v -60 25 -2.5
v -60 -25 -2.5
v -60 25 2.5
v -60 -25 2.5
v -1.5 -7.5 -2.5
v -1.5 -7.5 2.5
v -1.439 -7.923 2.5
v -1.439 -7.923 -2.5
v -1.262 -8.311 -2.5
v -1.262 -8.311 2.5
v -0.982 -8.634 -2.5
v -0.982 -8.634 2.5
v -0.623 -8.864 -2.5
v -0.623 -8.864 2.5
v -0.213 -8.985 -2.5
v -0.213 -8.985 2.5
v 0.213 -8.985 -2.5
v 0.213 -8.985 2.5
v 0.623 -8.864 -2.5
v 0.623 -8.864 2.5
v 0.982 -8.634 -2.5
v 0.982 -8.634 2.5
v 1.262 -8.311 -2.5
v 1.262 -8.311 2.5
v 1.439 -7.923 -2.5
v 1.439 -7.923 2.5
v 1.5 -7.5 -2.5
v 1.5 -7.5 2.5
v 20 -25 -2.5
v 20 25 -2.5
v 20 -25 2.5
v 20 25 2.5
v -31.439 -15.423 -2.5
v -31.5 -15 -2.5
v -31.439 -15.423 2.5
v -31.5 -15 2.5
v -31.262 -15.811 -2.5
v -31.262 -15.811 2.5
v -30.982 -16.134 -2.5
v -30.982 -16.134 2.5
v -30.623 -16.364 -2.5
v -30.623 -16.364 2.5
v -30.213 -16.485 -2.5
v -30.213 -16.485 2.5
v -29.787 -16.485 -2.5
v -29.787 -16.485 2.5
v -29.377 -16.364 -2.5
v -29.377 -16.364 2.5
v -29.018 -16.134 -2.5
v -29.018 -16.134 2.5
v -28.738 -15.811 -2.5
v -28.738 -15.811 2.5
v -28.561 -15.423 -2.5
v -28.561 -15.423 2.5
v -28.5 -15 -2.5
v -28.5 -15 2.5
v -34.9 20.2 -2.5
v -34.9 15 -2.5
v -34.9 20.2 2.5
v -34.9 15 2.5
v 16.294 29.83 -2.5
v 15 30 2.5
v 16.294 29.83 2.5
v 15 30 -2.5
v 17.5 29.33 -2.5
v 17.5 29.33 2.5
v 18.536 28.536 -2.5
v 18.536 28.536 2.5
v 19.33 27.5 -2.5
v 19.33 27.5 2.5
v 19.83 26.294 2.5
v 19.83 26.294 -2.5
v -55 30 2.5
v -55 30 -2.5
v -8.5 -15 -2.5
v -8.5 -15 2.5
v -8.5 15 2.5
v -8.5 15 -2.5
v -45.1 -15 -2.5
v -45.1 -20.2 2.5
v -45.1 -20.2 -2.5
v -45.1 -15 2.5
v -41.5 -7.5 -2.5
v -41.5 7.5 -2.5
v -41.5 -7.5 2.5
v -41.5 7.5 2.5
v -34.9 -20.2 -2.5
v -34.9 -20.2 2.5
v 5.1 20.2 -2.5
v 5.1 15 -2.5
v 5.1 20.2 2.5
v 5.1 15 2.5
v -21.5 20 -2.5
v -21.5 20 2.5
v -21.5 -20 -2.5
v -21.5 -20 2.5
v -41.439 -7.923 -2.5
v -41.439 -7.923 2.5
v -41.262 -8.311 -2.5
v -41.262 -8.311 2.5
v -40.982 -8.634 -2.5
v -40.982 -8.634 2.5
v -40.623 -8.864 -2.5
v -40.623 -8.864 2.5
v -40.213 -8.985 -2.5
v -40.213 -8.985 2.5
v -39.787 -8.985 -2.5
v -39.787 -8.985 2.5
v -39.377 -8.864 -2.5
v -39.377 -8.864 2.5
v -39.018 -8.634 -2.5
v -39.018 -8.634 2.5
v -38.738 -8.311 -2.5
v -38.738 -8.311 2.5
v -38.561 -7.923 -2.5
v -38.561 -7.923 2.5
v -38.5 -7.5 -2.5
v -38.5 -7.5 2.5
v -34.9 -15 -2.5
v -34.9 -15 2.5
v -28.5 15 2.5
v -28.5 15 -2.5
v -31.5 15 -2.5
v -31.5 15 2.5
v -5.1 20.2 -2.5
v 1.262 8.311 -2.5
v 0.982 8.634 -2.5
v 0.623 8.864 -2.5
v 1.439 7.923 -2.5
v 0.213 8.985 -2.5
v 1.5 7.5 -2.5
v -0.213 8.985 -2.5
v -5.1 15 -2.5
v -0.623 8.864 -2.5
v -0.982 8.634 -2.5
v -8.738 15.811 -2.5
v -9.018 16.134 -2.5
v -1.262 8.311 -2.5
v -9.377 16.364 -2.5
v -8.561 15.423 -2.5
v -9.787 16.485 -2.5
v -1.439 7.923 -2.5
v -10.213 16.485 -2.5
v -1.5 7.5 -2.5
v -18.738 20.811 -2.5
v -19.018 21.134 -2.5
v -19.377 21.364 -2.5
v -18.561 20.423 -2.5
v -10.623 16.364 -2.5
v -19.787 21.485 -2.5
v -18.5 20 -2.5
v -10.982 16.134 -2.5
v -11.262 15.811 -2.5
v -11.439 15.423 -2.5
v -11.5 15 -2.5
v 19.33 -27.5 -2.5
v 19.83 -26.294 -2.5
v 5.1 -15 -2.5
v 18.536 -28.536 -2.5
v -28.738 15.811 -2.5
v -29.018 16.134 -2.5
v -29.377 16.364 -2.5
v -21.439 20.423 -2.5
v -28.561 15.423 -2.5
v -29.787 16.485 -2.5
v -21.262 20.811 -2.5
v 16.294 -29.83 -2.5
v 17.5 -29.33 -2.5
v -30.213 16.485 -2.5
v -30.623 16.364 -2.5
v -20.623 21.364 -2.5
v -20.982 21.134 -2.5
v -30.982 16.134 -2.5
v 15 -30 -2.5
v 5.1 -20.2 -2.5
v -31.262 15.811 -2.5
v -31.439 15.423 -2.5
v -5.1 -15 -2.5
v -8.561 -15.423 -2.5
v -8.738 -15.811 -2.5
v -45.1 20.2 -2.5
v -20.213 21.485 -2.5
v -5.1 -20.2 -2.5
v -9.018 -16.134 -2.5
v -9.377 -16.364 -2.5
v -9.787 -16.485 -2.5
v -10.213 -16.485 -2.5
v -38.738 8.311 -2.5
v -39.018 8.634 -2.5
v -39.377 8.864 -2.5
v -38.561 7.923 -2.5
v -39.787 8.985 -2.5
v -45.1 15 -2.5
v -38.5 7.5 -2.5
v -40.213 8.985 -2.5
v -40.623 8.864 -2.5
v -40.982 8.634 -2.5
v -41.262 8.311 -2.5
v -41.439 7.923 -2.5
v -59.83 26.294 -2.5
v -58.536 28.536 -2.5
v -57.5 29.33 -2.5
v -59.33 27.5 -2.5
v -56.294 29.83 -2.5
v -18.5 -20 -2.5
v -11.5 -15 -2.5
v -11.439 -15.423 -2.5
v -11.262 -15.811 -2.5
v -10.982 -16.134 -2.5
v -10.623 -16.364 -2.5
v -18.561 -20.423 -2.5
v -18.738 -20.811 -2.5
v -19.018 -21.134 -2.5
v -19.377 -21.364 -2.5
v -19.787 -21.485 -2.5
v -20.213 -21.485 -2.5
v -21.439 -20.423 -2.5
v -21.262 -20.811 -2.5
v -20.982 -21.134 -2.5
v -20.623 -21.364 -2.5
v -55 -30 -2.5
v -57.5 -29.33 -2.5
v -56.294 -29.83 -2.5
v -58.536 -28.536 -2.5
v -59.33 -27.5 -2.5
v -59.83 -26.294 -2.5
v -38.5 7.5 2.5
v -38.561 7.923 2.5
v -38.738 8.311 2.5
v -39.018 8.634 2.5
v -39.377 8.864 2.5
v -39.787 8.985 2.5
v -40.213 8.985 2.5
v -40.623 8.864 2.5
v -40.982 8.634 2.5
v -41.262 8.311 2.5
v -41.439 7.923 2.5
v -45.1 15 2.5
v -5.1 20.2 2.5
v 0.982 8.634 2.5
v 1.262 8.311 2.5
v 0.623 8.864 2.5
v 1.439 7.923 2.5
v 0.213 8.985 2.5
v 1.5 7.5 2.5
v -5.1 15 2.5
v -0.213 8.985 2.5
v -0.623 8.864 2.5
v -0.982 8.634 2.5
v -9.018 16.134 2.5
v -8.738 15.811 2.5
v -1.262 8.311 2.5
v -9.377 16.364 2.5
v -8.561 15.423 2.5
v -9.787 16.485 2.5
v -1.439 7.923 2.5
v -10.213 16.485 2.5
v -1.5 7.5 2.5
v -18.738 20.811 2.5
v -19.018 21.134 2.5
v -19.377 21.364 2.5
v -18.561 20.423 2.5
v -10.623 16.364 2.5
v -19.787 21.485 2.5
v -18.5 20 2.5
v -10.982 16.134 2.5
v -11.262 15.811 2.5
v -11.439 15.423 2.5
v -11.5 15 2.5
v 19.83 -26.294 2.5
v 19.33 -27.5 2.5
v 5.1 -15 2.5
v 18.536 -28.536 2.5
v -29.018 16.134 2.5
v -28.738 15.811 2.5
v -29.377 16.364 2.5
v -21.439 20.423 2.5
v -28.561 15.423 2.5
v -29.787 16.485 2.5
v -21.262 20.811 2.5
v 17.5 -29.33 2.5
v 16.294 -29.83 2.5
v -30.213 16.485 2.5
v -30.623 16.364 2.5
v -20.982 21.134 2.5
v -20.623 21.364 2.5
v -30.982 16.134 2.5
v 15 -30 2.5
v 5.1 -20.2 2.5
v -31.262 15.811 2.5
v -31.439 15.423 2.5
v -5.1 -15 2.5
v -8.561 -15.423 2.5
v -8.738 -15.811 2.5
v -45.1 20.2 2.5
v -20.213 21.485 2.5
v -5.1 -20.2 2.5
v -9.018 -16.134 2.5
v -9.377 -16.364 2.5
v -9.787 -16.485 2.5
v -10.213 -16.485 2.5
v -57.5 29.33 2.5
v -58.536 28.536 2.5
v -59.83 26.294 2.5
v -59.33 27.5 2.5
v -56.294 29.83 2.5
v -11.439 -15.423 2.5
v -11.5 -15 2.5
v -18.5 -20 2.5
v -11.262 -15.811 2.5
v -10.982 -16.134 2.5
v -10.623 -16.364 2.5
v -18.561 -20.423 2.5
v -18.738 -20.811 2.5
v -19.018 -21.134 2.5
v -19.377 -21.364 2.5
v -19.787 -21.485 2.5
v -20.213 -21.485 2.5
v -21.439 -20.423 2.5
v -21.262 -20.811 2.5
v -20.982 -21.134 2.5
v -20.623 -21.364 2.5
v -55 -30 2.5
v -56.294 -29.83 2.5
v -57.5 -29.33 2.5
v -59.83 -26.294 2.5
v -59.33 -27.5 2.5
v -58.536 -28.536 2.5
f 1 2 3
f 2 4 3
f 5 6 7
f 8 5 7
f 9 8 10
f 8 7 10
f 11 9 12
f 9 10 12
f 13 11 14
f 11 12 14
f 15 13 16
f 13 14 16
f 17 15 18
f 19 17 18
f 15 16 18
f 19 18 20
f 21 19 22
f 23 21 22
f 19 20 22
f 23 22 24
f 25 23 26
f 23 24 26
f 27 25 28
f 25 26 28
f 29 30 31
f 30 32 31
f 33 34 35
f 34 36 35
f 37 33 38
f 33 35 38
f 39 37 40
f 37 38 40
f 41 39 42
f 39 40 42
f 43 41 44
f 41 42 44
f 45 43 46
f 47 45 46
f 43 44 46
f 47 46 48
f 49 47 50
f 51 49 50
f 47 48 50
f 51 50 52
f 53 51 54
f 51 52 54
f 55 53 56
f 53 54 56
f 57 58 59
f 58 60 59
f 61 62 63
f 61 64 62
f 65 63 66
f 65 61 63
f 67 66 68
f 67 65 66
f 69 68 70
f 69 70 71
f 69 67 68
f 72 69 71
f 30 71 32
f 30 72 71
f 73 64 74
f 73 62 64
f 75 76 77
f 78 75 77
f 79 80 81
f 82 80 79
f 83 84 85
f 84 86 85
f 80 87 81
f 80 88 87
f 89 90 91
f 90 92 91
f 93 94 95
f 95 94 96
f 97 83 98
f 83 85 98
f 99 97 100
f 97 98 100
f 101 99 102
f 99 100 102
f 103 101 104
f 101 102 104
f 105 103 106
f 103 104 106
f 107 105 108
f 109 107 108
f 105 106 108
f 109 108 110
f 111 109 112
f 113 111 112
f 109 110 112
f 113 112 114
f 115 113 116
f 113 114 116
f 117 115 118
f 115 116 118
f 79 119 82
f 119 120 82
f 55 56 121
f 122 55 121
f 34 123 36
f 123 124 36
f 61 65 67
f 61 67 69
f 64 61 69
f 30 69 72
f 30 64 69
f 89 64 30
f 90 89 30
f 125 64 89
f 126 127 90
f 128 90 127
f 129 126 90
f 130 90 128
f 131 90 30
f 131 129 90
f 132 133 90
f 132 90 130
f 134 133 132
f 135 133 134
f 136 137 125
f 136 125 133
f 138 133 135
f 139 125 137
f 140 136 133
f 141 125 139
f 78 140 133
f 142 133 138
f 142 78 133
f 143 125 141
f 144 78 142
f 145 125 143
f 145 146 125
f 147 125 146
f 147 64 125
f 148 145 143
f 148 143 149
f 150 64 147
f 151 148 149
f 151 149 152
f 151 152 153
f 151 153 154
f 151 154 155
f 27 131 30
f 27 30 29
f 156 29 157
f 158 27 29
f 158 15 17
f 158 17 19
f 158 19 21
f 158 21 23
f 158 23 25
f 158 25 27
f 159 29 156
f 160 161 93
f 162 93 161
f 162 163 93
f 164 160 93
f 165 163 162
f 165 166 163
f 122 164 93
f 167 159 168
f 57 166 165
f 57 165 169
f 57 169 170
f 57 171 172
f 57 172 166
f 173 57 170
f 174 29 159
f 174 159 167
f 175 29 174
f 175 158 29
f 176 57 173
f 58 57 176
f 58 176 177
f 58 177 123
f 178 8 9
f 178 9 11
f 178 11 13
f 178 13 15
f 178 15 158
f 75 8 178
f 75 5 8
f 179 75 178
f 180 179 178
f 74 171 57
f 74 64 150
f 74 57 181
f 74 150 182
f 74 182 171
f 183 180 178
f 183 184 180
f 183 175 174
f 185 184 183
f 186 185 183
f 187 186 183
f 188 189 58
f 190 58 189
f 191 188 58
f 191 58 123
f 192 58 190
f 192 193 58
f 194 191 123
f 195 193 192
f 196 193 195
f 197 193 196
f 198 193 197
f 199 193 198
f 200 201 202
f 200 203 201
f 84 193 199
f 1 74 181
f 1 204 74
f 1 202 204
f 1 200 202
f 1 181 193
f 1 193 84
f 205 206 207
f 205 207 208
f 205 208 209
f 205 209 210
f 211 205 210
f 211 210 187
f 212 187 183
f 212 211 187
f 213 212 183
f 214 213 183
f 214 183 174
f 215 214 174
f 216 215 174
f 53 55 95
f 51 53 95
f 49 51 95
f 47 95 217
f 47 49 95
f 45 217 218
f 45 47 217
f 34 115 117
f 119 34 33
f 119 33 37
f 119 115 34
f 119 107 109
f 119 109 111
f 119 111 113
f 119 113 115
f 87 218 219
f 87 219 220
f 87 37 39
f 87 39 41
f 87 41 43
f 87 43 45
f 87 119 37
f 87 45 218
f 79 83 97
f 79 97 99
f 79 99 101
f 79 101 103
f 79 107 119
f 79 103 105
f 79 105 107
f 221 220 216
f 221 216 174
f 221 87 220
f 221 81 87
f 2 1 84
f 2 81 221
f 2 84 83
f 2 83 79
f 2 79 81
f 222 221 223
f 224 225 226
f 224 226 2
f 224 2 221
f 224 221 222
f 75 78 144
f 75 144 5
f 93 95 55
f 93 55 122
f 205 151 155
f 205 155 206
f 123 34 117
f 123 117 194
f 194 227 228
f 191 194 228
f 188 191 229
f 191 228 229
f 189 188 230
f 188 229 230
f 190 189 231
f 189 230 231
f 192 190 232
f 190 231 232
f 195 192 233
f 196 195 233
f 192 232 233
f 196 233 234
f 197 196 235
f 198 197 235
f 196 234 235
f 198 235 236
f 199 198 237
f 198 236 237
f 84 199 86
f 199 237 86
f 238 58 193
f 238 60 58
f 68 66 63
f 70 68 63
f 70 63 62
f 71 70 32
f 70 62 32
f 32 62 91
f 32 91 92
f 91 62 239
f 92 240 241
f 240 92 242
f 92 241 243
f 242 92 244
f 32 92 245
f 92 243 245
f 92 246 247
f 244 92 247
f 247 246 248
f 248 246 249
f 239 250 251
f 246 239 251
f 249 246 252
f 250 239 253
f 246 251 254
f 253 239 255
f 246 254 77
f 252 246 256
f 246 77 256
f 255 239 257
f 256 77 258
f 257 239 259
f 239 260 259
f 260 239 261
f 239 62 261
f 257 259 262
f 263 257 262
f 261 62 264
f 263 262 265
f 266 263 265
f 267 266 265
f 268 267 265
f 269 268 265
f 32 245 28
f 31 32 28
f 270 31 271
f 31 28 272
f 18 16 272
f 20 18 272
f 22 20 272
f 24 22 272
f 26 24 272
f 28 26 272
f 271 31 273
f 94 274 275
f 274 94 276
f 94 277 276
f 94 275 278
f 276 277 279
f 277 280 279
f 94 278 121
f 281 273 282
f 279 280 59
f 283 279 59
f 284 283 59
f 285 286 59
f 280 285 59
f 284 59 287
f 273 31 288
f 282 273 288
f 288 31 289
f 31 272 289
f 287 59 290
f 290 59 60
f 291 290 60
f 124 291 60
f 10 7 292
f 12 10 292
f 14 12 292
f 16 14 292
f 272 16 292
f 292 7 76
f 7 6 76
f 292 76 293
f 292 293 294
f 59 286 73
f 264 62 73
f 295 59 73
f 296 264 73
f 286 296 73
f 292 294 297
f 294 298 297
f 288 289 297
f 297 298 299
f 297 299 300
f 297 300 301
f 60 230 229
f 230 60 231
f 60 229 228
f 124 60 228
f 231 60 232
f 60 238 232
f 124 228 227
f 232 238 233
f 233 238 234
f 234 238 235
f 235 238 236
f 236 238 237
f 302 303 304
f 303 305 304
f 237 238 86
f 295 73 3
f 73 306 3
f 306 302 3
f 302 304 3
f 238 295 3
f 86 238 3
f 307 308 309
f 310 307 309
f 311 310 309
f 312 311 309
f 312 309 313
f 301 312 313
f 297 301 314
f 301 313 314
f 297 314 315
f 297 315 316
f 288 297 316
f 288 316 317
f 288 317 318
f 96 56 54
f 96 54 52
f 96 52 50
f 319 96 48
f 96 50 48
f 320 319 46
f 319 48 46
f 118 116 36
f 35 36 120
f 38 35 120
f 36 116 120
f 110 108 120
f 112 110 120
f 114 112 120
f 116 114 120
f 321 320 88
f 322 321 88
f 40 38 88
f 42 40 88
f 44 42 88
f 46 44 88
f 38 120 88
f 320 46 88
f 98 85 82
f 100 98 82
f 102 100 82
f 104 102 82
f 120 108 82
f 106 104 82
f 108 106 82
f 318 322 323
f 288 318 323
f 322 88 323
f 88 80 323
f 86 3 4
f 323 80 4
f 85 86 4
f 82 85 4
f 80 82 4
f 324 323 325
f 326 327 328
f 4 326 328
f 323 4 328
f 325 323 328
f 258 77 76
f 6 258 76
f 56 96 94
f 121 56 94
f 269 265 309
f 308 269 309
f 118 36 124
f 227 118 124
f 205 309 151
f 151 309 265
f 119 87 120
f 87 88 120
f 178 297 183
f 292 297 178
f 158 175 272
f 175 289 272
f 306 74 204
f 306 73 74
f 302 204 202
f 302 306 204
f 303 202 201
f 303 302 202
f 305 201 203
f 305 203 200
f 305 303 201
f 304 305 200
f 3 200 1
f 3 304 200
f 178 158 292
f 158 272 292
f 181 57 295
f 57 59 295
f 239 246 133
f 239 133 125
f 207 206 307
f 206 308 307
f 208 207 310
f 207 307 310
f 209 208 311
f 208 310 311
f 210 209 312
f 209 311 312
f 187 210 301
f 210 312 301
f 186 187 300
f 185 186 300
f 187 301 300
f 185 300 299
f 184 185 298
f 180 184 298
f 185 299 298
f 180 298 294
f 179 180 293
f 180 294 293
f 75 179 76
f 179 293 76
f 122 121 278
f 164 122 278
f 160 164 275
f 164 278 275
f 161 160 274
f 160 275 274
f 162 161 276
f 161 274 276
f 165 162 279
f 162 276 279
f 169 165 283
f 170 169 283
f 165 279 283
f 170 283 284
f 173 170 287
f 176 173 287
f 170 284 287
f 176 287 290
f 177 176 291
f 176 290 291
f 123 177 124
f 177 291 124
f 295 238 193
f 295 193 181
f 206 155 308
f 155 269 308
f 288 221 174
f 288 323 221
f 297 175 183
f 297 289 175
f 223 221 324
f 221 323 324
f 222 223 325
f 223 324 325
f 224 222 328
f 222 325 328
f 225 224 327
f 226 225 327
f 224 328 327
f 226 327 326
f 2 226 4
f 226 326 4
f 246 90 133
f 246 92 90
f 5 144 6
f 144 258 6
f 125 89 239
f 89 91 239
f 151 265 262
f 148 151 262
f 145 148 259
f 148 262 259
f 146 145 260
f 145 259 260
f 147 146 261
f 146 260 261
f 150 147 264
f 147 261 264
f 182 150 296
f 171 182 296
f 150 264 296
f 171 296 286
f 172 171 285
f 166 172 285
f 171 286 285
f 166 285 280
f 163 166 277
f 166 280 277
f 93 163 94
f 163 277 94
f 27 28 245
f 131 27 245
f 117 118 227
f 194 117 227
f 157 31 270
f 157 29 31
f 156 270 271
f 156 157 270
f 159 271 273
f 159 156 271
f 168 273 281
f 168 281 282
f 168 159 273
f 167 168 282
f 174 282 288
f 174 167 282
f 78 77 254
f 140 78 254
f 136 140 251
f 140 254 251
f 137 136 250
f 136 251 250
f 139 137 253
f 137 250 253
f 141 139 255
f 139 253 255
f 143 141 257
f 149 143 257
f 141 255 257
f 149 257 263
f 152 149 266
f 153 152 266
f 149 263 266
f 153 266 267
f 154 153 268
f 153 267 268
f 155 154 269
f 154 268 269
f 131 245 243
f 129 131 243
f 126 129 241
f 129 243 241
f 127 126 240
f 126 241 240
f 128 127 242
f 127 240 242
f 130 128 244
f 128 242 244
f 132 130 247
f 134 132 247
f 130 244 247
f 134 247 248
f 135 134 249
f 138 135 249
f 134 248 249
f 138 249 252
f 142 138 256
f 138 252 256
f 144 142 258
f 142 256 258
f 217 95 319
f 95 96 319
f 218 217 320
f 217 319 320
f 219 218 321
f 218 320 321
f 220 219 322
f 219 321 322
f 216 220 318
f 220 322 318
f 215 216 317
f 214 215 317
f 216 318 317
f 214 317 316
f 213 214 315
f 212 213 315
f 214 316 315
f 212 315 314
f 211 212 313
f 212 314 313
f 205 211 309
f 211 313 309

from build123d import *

# Parameters (mm, degrees)
SKETCH1_W           = 5.2
SKETCH1_H           = 10.2
BOSS_EXTRUDE1_DEPTH = 2.5
FILLET1_R           = 5


with BuildPart() as part:
    # Sketch1 → Boss-Extrude1 (new, symmetric)
    with BuildSketch(Plane(origin=(0, 0, 0), x_dir=(0, 1, 0), z_dir=(0, 0, 1))):
        Polygon((30, 0), (30, -20), (-30, -20), (-30, 0), (-30, 40), (-30, 60), (30, 60), (30, 40), align=None)
        with Locations((17.6, 0)):
            Rectangle(SKETCH1_W, SKETCH1_H, mode=Mode.SUBTRACT)
        with Locations((17.6, 40)):
            Rectangle(SKETCH1_W, SKETCH1_H, mode=Mode.SUBTRACT)
        with Locations((-17.6, 0)):
            Rectangle(SKETCH1_W, SKETCH1_H, mode=Mode.SUBTRACT)
        with Locations((-17.6, 40)):
            Rectangle(SKETCH1_W, SKETCH1_H, mode=Mode.SUBTRACT)
        with BuildLine():
            Line((7.5, 41.5), (-7.5, 41.5))
            ThreePointArc((-7.5, 41.5), (-9, 40), (-7.5, 38.5))
            Line((-7.5, 38.5), (7.5, 38.5))
            ThreePointArc((7.5, 38.5), (9, 40), (7.5, 41.5))
        make_face(mode=Mode.SUBTRACT)
        with BuildLine():
            Line((15, 31.5), (-15, 31.5))
            ThreePointArc((-15, 31.5), (-16.5, 30), (-15, 28.5))
            Line((-15, 28.5), (15, 28.5))
            ThreePointArc((15, 28.5), (16.5, 30), (15, 31.5))
        make_face(mode=Mode.SUBTRACT)
        with BuildLine():
            Line((20, 21.5), (-20, 21.5))
            ThreePointArc((-20, 21.5), (-21.5, 20), (-20, 18.5))
            Line((-20, 18.5), (20, 18.5))
            ThreePointArc((20, 18.5), (21.5, 20), (20, 21.5))
        make_face(mode=Mode.SUBTRACT)
        with BuildLine():
            Line((15, 11.5), (-15, 11.5))
            ThreePointArc((-15, 11.5), (-16.5, 10), (-15, 8.5))
            Line((-15, 8.5), (15, 8.5))
            ThreePointArc((15, 8.5), (16.5, 10), (15, 11.5))
        make_face(mode=Mode.SUBTRACT)
        with BuildLine():
            Line((7.5, 1.5), (-7.5, 1.5))
            ThreePointArc((-7.5, 1.5), (-9, 0), (-7.5, -1.5))
            Line((-7.5, -1.5), (7.5, -1.5))
            ThreePointArc((7.5, -1.5), (9, 0), (7.5, 1.5))
        make_face(mode=Mode.SUBTRACT)
    extrude(amount=BOSS_EXTRUDE1_DEPTH, both=True)

    # Fillet1
    fillet1_edges = [part.edges().sort_by_distance(p)[0] for p in [
        (-60, -30, 0),
        (-60, 30, 0),
        (20, 30, 0),
        (20, -30, 0),
    ]]
    fillet(fillet1_edges, radius=FILLET1_R)


solid = part.part
